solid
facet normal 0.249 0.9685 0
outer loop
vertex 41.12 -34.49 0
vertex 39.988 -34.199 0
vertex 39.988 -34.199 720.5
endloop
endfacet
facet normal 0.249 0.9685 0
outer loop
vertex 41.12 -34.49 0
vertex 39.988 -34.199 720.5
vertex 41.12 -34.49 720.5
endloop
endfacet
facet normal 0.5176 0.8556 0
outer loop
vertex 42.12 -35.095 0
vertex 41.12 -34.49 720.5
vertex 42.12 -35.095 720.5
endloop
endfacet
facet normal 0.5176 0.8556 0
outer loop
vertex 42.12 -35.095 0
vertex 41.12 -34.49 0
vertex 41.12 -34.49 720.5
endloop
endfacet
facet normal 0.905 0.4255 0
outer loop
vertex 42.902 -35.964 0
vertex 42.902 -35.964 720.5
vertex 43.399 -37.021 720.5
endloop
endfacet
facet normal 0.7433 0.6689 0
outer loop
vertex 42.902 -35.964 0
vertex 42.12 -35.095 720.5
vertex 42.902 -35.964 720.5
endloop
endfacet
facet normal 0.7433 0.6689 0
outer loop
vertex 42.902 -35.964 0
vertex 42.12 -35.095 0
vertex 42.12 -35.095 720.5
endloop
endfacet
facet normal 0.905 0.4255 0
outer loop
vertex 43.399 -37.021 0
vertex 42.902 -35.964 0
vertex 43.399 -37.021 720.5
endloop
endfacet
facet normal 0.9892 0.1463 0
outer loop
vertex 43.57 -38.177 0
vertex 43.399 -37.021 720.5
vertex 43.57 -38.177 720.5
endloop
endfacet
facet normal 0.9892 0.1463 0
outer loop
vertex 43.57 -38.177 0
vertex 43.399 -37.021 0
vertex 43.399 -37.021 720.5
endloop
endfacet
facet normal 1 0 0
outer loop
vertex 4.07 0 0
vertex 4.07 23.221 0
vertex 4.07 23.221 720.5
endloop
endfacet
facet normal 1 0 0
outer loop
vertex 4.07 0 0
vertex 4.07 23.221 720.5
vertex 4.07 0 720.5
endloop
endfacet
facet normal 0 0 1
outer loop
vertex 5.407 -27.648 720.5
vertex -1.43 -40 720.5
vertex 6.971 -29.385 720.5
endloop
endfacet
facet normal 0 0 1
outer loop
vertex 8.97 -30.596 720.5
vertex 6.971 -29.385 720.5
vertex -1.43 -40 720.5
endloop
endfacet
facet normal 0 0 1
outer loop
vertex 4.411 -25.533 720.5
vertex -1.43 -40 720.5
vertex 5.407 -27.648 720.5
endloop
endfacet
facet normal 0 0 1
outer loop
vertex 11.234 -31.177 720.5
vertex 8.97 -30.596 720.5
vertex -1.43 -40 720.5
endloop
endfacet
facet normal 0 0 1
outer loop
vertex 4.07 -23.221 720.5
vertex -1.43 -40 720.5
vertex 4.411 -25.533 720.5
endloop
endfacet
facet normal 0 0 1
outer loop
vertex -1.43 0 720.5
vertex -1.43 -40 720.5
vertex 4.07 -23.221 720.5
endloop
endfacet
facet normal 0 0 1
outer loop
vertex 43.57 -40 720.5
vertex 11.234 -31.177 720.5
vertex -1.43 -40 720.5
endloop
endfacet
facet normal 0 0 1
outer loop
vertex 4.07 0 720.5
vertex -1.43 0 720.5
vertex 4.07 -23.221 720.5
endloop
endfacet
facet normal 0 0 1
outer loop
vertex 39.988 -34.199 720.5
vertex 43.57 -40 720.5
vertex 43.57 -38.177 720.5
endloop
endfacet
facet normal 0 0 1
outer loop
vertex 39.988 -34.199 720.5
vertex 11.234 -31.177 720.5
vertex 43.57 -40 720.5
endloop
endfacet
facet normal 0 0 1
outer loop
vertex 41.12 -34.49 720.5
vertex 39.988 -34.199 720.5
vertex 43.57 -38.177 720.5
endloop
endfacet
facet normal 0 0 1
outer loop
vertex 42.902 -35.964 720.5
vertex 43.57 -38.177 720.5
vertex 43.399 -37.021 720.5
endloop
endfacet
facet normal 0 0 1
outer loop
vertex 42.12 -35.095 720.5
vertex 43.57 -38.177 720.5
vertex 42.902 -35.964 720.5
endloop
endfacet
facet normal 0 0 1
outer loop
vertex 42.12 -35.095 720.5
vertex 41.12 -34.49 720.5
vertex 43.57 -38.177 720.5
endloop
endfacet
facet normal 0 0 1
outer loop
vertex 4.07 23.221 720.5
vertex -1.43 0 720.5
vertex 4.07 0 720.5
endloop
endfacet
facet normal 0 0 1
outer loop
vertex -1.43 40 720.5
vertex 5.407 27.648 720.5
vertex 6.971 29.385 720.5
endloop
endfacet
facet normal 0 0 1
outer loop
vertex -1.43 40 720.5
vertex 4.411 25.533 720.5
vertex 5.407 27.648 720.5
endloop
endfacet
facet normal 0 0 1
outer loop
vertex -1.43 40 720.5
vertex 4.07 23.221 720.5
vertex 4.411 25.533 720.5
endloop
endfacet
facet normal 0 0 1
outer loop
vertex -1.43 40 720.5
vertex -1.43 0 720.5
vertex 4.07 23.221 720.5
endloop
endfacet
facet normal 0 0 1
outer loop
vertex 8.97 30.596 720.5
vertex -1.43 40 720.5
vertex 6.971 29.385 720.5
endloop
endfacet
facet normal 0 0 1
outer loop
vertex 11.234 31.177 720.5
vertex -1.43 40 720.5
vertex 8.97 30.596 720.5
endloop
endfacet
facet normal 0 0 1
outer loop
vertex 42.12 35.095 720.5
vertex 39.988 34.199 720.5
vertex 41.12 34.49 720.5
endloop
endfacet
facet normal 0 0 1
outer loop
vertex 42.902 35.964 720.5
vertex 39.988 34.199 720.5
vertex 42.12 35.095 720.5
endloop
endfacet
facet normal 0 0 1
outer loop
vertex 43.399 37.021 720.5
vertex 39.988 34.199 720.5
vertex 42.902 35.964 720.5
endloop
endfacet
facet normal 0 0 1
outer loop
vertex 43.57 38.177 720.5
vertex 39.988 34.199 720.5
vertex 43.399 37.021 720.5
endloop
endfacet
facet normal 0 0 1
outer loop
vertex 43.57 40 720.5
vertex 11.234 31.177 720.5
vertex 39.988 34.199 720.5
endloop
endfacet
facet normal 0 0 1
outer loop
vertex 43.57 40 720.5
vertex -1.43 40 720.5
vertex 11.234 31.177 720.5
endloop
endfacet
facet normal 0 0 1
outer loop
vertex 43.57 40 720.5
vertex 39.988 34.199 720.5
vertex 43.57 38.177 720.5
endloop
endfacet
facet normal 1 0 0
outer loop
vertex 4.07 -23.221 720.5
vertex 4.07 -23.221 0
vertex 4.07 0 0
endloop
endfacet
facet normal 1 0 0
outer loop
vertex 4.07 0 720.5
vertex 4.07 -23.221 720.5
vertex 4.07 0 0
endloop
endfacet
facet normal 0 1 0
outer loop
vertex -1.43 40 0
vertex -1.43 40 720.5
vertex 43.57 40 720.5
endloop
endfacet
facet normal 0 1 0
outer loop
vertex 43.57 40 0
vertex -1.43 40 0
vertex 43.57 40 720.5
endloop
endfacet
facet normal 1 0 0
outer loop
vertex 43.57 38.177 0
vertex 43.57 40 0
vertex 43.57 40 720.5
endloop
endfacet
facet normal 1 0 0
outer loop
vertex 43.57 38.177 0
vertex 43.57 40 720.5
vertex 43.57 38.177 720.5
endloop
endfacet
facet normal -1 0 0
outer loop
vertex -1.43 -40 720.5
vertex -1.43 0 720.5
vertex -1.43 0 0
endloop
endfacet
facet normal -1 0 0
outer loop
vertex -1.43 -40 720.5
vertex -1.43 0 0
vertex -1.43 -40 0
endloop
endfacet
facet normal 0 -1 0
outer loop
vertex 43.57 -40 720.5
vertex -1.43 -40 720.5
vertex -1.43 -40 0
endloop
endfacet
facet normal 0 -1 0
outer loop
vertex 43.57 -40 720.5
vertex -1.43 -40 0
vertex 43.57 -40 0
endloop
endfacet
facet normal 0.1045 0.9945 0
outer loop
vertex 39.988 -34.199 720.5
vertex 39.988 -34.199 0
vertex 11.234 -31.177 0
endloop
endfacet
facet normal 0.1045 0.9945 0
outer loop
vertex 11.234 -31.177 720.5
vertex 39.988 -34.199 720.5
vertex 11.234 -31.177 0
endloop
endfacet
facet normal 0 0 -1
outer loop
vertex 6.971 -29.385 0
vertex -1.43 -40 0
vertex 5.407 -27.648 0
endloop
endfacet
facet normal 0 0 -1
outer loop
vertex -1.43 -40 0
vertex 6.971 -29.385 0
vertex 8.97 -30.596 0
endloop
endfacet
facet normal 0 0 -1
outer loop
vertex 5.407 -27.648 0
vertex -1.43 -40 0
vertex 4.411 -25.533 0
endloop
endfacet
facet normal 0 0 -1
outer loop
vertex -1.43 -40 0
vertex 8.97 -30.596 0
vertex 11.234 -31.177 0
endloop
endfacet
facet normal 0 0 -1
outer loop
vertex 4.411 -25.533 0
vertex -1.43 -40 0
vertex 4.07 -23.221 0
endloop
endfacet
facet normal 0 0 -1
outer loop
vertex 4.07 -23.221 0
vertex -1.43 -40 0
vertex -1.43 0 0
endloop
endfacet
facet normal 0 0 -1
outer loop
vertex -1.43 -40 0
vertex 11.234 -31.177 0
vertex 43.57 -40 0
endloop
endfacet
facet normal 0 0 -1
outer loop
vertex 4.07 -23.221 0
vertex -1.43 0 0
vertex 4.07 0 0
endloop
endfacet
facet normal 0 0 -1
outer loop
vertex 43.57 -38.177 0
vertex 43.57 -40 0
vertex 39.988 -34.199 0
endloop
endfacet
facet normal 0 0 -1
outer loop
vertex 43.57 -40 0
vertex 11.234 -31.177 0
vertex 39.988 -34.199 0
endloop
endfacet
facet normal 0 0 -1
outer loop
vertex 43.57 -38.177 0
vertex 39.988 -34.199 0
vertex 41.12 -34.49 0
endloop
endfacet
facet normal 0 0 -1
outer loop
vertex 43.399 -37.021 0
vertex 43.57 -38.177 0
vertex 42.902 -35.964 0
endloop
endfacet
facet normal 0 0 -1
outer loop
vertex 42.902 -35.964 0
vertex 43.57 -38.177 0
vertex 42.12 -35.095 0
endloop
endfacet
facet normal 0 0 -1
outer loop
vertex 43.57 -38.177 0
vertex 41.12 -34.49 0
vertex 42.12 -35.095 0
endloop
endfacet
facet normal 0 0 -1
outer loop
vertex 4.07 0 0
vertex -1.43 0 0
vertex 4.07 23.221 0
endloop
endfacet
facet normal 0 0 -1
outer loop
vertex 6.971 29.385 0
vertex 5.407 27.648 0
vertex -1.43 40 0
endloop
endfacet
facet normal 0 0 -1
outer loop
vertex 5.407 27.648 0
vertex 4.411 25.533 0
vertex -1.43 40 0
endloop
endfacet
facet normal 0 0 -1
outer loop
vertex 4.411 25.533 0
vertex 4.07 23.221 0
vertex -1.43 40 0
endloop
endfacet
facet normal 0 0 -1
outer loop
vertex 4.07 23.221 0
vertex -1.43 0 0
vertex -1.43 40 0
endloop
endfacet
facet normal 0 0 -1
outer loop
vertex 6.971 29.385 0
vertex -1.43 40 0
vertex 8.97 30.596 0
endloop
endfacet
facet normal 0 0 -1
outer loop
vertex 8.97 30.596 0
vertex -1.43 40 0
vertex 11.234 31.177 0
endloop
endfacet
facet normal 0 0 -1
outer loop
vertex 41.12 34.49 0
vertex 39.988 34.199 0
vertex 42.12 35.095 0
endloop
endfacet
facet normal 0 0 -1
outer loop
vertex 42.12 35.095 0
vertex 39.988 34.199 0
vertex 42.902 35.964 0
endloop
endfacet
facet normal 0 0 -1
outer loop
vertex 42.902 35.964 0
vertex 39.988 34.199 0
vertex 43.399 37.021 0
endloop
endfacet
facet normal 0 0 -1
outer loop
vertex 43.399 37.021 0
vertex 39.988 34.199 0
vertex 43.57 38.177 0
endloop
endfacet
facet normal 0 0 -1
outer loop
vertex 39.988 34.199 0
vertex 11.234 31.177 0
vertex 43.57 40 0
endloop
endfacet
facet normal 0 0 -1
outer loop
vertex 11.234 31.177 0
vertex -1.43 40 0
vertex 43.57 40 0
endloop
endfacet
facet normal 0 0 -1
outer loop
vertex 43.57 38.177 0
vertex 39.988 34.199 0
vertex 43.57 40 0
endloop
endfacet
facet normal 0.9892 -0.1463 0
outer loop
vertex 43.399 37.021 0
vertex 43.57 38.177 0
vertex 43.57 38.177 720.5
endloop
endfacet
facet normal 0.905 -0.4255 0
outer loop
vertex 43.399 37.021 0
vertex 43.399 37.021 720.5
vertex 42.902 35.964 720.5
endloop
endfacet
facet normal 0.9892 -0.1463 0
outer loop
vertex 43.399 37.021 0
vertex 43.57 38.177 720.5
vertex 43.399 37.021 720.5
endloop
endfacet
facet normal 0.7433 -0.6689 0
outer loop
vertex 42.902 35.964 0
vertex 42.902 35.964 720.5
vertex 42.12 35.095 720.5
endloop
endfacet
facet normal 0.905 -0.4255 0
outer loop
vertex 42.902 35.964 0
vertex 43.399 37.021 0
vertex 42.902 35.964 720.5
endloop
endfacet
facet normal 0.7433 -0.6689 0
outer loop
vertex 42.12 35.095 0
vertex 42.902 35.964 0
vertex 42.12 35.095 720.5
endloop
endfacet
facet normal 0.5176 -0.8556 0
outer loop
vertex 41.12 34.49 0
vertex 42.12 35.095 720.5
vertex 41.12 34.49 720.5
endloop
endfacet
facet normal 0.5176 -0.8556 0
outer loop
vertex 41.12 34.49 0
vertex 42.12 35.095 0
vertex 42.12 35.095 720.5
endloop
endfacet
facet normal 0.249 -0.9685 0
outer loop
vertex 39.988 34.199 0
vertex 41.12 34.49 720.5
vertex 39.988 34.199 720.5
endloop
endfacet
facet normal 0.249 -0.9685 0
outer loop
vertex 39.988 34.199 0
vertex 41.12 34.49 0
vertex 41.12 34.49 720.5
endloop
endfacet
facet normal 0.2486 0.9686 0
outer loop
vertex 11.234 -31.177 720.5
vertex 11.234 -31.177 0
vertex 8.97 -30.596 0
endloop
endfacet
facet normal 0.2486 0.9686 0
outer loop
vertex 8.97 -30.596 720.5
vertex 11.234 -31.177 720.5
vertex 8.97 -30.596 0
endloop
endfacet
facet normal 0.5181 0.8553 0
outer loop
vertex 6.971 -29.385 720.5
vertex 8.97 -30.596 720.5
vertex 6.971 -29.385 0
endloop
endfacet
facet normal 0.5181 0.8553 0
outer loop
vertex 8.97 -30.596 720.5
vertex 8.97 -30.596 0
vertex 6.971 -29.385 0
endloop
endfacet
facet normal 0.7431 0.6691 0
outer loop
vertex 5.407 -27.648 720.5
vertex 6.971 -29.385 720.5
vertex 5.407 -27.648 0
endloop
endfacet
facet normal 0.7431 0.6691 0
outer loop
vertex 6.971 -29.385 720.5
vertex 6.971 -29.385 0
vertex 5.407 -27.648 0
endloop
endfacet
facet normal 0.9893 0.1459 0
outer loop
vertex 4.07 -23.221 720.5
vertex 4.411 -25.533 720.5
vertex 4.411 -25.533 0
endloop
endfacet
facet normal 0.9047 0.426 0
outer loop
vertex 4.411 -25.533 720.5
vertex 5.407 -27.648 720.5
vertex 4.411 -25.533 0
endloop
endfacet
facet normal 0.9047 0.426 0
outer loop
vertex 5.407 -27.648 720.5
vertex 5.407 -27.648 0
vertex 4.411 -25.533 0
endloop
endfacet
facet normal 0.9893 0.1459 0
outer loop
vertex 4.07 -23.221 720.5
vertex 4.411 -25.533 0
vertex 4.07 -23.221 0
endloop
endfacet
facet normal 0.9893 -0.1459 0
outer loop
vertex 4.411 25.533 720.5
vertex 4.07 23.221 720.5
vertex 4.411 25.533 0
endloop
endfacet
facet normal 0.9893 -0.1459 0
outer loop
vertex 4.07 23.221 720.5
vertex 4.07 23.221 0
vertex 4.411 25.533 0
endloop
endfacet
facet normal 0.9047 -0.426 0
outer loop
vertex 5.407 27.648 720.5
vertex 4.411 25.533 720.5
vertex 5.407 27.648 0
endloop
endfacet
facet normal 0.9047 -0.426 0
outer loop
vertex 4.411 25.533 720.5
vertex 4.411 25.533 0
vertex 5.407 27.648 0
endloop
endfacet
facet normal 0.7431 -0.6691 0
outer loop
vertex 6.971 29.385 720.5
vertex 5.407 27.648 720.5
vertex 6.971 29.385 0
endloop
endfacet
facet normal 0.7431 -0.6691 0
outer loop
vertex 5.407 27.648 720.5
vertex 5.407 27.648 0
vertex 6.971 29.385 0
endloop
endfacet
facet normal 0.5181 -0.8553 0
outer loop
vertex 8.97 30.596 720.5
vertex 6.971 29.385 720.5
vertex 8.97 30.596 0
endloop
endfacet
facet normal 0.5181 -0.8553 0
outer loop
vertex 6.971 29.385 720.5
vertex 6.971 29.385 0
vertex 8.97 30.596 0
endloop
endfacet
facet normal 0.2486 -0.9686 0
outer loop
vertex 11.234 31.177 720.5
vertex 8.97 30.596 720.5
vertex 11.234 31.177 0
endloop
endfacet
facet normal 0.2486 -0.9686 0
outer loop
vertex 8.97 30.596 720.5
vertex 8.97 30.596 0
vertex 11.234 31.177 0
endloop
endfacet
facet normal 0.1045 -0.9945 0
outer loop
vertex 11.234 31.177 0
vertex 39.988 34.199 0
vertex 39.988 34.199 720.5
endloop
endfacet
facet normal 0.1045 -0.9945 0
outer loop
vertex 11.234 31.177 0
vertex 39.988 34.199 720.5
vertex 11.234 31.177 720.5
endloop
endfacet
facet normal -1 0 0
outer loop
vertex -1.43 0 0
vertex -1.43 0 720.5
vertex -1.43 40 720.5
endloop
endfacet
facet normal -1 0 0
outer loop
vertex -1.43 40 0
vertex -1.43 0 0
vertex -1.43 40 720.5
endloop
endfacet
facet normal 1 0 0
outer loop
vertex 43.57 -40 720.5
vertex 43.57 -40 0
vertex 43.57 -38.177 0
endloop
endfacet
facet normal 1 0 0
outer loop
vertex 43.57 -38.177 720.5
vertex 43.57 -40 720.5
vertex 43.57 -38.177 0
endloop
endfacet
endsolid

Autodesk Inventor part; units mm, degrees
ref_plane "YZ Plane" through (0, 0, 0) normal (1, 0, 0) x (0, 1, 0)
ref_plane "Начальная плоскость" through (0, 0, 0) normal (0, 0, 1) x (1, 0, 0)
ref_plane "Конечная плоскость" through (0, 0, 720.5) normal (0, 0, 1) x (1, 0, 0)
sketch "Эскиз" plane through (0, 0, 0) normal (0, 0, 1) x (1, 0, 0)
  line L0 (-1.43, 0) -> (-1.43, 40)
  line L1 (-1.43, 40) -> (43.57, 40)
  line L2 (43.57, 40) -> (43.57, 38.1774)
  line L3 (39.9881, 34.1993) -> (11.2338, 31.1771)
  line L4 (4.07, 23.221) -> (4.07, 0)
  line L5 (4.07, 0) -> (-1.43, 0) construction
  line L6 (23.82, 40) -> (23.82, 32.5) construction
  line L7 (43.57, 34.5758) -> (43.57, 32.5) construction
  line L8 (43.57, 32.5) -> (23.82, 32.5) construction
  line L9 (0, 15) -> (0, -27) construction
  line L10 (-5.539, 0) -> (16.0067, 0) construction
  line L11 (-1.43, 0) -> (-1.43, -40)
  line L12 (-1.43, -40) -> (43.57, -40)
  line L13 (43.57, -40) -> (43.57, -38.1774)
  line L14 (39.9881, -34.1993) -> (11.2338, -31.1771)
  line L15 (4.07, -23.221) -> (4.07, 0)
  arc A0 (11.2338, 31.1771) -> (4.07, 23.221) centre (12.07, 23.221) ccw
  arc A1 (4.07, -23.221) -> (11.2338, -31.1771) centre (12.07, -23.221) ccw
  arc A2 (39.9881, 34.1993) -> (43.57, 38.1774) centre (39.57, 38.1774) ccw
  arc A3 (43.57, -38.1774) -> (39.9881, -34.1993) centre (39.57, -38.1774) ccw
  line L16 (0, 56) -> (0, -56) construction
  line L17 (-15.5135, 0) -> (54.308, 0) construction
  point P0 (4.07, 30.4242)
  point P1 (43.57, -34.5758)
  point P2 (4.07, -30.4242)
  point P3 (23.82, -40)
  point P4 (23.82, -32.5)
  dimension "d0" = 5.5
  dimension "d1" = 40
  dimension "d2" = 45
  dimension "d3" = 7.5
  dimension "d4" = 19.75
  dimension "d5" = 2.0758
  dimension "d23" = 8
  dimension "d24" = 4
  dimension "d25" = 1.43
extrude "Тело" add sketch "Эскиз" along normal up to surface (720.5 mm away) from surface at 0
sketch "Sketch3" plane through (0, 0, 0) normal (0, 0, 1) x (1, 0, 0)
  line L0 (0, 0) -> (10, 0)
ref_plane "Work Plane3" through (0, 0, 0) normal (0, -1, 0) x (1, 0, 0)
sketch "Sketch4" plane through (0, 0, 0) normal (0, -1, 0) x (1, 0, 0)
  line L0 (-2, 0) -> (12, 0)
  line L1 (-2, 720.5) -> (12, 720.5)
  dimension "d29" = 720.5
equation "\"d0\" = G_T"
equation "\"d1\" = 0.5 * G_H"
equation "\"d2\" = G_W"
equation "\"d3\" = G_T1"
equation "\"d4\" = G_C"
equation "\"d23\" = G_IR"
equation "\"d24\" = G_ER"
equation "\"d25\" = ex"
equation "\"d6\" = G_L"
equation "\"G_W\" = 45"
equation "\"G_T\" = 5.5"
equation "\"G_T1\" = 7.5"
equation "\"G_NG\" = 0.105104"
equation "\"G_ER\" = 4"
equation "\"G_IR\" = 8"
equation "\"G_C\" = 19.75"
equation "\"G_L\" = d29"
equation "\"ex\" = 1.43"
equation "\"G_OFFSET_START\" = 0"
equation "\"G_OFFSET_END\" = 0"
equation "\"d27\" = G_OFFSET_END + B_L"
equation "\"B_L\" = 720.5"
equation "\"G_H\" = 80"
properties part number "ISO 657/11 - CH 80 x 8 - 720,5" material "Сталь, мягкая"
